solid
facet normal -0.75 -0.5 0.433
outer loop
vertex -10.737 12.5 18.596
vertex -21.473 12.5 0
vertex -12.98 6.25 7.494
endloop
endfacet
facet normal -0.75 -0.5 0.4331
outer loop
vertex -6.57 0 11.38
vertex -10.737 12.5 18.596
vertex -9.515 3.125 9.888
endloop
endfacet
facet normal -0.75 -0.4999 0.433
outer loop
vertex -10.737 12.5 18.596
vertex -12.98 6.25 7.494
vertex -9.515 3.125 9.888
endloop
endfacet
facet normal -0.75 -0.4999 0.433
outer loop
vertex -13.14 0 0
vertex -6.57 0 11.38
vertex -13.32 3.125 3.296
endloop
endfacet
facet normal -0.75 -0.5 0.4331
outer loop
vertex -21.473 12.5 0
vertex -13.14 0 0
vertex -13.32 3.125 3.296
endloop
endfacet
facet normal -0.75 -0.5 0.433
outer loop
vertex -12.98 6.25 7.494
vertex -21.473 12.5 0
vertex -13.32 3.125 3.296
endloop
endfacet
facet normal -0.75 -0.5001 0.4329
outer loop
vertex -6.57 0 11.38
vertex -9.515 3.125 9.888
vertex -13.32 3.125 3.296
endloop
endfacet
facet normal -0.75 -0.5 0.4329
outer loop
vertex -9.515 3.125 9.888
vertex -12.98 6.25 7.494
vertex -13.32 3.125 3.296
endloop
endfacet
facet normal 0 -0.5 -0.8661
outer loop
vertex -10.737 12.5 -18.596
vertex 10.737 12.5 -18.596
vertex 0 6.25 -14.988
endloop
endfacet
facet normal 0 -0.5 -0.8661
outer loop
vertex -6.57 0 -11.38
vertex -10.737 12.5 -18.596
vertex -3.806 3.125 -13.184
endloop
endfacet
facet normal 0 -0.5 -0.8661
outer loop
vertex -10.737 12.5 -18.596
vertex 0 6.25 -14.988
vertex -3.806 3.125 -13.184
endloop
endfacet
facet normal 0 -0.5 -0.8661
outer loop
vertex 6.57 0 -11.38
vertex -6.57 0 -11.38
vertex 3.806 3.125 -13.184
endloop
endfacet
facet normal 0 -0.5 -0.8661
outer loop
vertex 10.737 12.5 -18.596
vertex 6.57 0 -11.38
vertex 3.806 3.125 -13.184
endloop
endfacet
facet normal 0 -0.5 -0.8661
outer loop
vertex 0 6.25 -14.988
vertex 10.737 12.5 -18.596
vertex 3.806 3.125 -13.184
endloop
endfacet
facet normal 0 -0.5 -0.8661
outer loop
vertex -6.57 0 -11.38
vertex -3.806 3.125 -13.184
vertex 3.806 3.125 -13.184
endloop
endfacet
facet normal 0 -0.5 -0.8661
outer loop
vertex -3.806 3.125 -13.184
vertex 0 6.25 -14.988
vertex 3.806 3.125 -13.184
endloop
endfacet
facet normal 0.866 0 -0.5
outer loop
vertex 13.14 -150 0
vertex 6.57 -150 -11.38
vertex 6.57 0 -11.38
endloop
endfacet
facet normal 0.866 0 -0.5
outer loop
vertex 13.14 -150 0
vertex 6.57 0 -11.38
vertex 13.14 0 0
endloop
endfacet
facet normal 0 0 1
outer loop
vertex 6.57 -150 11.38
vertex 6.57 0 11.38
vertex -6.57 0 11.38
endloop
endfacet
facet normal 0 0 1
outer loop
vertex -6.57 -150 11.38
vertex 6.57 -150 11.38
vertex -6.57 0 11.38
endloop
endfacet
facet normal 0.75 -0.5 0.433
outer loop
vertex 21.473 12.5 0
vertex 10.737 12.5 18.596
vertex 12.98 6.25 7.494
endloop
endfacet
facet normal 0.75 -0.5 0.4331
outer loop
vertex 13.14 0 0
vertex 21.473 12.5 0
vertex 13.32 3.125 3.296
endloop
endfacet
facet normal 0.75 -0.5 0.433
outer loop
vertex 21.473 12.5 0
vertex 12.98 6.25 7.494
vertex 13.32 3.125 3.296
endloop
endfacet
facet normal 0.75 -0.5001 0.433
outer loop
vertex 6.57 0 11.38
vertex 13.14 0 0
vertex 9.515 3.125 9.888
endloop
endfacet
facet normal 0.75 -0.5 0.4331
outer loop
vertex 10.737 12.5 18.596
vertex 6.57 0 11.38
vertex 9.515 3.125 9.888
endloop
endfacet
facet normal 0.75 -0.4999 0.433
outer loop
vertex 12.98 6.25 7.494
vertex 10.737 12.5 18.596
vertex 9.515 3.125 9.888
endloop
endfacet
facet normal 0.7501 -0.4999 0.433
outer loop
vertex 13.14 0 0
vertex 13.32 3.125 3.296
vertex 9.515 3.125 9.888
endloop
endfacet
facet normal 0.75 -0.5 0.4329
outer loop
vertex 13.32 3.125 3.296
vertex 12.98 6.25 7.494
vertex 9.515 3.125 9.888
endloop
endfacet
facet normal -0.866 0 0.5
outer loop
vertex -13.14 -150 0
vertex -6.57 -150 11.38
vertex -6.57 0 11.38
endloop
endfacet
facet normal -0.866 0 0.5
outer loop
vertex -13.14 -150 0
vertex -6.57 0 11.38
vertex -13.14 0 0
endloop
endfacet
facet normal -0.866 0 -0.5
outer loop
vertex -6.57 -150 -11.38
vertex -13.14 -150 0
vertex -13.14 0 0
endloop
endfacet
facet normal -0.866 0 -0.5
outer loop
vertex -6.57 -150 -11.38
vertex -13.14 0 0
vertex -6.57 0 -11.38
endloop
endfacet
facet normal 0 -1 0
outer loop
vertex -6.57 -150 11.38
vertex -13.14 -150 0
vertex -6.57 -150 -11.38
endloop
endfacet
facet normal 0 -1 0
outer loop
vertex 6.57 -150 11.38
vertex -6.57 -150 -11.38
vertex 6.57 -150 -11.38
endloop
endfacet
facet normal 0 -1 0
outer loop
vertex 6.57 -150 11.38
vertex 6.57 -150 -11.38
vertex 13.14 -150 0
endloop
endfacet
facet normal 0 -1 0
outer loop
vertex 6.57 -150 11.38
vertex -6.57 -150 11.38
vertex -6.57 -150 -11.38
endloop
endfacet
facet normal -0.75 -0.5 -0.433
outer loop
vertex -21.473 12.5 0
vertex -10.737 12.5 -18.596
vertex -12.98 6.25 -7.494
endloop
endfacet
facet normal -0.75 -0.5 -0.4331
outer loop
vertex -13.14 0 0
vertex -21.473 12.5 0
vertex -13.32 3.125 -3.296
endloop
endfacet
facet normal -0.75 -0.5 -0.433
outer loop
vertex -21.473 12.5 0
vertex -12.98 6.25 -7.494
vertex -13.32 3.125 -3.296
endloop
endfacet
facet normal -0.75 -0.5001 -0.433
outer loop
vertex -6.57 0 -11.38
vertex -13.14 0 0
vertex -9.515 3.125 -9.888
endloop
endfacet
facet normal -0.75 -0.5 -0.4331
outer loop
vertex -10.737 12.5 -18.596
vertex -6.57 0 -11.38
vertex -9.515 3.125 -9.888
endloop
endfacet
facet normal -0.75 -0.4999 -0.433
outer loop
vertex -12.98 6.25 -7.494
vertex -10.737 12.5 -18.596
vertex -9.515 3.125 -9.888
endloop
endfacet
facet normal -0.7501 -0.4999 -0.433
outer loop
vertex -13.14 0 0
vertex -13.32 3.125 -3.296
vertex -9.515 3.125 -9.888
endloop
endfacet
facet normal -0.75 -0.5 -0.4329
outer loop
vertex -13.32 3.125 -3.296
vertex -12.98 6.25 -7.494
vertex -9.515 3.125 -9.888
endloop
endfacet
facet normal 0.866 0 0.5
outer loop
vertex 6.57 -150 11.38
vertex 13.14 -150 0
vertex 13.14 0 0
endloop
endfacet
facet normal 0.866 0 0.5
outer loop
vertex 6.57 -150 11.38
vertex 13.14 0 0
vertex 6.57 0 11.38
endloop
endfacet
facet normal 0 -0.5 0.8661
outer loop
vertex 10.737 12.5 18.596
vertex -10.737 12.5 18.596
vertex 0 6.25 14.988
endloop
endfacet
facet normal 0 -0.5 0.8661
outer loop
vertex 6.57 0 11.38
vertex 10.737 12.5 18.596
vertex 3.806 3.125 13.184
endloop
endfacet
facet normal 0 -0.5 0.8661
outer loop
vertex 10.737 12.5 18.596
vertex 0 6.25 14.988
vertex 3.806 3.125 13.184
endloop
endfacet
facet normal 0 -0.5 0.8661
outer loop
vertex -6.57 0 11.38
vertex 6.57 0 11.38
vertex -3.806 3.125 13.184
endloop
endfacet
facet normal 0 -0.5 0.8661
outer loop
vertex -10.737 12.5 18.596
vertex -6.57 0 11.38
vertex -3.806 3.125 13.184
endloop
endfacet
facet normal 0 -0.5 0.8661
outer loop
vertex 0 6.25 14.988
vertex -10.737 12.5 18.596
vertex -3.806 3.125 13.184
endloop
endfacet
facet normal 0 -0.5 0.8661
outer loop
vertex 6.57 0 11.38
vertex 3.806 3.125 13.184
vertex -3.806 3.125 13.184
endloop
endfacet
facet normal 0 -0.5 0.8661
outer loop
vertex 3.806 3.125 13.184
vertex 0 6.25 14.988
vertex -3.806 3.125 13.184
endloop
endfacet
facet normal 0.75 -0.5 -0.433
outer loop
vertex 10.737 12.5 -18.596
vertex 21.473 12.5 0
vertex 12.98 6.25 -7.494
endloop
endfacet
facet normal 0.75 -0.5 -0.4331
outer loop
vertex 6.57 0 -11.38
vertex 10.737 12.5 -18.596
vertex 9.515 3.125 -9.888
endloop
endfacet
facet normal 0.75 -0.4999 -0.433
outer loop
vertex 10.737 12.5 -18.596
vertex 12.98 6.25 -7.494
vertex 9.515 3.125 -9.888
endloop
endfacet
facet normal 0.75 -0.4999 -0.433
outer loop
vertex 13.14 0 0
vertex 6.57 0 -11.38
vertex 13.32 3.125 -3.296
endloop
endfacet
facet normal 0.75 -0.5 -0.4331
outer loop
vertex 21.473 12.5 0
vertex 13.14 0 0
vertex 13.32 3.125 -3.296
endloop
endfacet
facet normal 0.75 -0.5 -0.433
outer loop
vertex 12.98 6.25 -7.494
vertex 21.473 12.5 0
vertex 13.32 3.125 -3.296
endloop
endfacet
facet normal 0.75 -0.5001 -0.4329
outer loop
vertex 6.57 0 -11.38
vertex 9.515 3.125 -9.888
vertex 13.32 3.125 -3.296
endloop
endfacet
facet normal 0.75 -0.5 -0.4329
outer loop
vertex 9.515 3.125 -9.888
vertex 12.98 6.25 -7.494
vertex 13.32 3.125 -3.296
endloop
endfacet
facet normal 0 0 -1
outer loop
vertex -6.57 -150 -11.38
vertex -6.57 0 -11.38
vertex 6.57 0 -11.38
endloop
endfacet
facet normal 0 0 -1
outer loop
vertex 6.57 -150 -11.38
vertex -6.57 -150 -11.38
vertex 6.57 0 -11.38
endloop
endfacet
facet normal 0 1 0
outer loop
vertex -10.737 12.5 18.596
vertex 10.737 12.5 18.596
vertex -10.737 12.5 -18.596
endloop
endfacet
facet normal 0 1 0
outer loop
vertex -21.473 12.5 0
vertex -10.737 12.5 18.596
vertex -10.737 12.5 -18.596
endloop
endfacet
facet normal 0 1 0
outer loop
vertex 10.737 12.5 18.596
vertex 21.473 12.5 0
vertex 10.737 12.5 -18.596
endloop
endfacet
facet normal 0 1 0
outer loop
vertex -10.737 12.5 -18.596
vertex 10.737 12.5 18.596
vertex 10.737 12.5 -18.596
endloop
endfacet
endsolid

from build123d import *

# Parameters (mm, degrees)
F1_DEPTH = 150
F2_DEPTH = 12.5
F2_TAPER = -30


with BuildPart() as f1:
    # F0 (on Front) → F1 (new body)
    with BuildSketch(Plane.XZ):
        Polygon((6.5699621812, 11.3795083016), (-6.5699621812, 11.3795083016), (-13.1399243624, 0), (-6.5699621812, -11.3795083016), (6.5699621812, -11.3795083016), (13.1399243624, 0), align=None)
    extrude(amount=F1_DEPTH)

    # F0 (on Front) → F2 (join)
    with BuildSketch(Plane.XZ):
        Polygon((6.5699621812, 11.3795083016), (-6.5699621812, 11.3795083016), (-13.1399243624, 0), (-6.5699621812, -11.3795083016), (6.5699621812, -11.3795083016), (13.1399243624, 0), align=None)
    extrude(amount=-F2_DEPTH, taper=F2_TAPER)


solid = f1.part
